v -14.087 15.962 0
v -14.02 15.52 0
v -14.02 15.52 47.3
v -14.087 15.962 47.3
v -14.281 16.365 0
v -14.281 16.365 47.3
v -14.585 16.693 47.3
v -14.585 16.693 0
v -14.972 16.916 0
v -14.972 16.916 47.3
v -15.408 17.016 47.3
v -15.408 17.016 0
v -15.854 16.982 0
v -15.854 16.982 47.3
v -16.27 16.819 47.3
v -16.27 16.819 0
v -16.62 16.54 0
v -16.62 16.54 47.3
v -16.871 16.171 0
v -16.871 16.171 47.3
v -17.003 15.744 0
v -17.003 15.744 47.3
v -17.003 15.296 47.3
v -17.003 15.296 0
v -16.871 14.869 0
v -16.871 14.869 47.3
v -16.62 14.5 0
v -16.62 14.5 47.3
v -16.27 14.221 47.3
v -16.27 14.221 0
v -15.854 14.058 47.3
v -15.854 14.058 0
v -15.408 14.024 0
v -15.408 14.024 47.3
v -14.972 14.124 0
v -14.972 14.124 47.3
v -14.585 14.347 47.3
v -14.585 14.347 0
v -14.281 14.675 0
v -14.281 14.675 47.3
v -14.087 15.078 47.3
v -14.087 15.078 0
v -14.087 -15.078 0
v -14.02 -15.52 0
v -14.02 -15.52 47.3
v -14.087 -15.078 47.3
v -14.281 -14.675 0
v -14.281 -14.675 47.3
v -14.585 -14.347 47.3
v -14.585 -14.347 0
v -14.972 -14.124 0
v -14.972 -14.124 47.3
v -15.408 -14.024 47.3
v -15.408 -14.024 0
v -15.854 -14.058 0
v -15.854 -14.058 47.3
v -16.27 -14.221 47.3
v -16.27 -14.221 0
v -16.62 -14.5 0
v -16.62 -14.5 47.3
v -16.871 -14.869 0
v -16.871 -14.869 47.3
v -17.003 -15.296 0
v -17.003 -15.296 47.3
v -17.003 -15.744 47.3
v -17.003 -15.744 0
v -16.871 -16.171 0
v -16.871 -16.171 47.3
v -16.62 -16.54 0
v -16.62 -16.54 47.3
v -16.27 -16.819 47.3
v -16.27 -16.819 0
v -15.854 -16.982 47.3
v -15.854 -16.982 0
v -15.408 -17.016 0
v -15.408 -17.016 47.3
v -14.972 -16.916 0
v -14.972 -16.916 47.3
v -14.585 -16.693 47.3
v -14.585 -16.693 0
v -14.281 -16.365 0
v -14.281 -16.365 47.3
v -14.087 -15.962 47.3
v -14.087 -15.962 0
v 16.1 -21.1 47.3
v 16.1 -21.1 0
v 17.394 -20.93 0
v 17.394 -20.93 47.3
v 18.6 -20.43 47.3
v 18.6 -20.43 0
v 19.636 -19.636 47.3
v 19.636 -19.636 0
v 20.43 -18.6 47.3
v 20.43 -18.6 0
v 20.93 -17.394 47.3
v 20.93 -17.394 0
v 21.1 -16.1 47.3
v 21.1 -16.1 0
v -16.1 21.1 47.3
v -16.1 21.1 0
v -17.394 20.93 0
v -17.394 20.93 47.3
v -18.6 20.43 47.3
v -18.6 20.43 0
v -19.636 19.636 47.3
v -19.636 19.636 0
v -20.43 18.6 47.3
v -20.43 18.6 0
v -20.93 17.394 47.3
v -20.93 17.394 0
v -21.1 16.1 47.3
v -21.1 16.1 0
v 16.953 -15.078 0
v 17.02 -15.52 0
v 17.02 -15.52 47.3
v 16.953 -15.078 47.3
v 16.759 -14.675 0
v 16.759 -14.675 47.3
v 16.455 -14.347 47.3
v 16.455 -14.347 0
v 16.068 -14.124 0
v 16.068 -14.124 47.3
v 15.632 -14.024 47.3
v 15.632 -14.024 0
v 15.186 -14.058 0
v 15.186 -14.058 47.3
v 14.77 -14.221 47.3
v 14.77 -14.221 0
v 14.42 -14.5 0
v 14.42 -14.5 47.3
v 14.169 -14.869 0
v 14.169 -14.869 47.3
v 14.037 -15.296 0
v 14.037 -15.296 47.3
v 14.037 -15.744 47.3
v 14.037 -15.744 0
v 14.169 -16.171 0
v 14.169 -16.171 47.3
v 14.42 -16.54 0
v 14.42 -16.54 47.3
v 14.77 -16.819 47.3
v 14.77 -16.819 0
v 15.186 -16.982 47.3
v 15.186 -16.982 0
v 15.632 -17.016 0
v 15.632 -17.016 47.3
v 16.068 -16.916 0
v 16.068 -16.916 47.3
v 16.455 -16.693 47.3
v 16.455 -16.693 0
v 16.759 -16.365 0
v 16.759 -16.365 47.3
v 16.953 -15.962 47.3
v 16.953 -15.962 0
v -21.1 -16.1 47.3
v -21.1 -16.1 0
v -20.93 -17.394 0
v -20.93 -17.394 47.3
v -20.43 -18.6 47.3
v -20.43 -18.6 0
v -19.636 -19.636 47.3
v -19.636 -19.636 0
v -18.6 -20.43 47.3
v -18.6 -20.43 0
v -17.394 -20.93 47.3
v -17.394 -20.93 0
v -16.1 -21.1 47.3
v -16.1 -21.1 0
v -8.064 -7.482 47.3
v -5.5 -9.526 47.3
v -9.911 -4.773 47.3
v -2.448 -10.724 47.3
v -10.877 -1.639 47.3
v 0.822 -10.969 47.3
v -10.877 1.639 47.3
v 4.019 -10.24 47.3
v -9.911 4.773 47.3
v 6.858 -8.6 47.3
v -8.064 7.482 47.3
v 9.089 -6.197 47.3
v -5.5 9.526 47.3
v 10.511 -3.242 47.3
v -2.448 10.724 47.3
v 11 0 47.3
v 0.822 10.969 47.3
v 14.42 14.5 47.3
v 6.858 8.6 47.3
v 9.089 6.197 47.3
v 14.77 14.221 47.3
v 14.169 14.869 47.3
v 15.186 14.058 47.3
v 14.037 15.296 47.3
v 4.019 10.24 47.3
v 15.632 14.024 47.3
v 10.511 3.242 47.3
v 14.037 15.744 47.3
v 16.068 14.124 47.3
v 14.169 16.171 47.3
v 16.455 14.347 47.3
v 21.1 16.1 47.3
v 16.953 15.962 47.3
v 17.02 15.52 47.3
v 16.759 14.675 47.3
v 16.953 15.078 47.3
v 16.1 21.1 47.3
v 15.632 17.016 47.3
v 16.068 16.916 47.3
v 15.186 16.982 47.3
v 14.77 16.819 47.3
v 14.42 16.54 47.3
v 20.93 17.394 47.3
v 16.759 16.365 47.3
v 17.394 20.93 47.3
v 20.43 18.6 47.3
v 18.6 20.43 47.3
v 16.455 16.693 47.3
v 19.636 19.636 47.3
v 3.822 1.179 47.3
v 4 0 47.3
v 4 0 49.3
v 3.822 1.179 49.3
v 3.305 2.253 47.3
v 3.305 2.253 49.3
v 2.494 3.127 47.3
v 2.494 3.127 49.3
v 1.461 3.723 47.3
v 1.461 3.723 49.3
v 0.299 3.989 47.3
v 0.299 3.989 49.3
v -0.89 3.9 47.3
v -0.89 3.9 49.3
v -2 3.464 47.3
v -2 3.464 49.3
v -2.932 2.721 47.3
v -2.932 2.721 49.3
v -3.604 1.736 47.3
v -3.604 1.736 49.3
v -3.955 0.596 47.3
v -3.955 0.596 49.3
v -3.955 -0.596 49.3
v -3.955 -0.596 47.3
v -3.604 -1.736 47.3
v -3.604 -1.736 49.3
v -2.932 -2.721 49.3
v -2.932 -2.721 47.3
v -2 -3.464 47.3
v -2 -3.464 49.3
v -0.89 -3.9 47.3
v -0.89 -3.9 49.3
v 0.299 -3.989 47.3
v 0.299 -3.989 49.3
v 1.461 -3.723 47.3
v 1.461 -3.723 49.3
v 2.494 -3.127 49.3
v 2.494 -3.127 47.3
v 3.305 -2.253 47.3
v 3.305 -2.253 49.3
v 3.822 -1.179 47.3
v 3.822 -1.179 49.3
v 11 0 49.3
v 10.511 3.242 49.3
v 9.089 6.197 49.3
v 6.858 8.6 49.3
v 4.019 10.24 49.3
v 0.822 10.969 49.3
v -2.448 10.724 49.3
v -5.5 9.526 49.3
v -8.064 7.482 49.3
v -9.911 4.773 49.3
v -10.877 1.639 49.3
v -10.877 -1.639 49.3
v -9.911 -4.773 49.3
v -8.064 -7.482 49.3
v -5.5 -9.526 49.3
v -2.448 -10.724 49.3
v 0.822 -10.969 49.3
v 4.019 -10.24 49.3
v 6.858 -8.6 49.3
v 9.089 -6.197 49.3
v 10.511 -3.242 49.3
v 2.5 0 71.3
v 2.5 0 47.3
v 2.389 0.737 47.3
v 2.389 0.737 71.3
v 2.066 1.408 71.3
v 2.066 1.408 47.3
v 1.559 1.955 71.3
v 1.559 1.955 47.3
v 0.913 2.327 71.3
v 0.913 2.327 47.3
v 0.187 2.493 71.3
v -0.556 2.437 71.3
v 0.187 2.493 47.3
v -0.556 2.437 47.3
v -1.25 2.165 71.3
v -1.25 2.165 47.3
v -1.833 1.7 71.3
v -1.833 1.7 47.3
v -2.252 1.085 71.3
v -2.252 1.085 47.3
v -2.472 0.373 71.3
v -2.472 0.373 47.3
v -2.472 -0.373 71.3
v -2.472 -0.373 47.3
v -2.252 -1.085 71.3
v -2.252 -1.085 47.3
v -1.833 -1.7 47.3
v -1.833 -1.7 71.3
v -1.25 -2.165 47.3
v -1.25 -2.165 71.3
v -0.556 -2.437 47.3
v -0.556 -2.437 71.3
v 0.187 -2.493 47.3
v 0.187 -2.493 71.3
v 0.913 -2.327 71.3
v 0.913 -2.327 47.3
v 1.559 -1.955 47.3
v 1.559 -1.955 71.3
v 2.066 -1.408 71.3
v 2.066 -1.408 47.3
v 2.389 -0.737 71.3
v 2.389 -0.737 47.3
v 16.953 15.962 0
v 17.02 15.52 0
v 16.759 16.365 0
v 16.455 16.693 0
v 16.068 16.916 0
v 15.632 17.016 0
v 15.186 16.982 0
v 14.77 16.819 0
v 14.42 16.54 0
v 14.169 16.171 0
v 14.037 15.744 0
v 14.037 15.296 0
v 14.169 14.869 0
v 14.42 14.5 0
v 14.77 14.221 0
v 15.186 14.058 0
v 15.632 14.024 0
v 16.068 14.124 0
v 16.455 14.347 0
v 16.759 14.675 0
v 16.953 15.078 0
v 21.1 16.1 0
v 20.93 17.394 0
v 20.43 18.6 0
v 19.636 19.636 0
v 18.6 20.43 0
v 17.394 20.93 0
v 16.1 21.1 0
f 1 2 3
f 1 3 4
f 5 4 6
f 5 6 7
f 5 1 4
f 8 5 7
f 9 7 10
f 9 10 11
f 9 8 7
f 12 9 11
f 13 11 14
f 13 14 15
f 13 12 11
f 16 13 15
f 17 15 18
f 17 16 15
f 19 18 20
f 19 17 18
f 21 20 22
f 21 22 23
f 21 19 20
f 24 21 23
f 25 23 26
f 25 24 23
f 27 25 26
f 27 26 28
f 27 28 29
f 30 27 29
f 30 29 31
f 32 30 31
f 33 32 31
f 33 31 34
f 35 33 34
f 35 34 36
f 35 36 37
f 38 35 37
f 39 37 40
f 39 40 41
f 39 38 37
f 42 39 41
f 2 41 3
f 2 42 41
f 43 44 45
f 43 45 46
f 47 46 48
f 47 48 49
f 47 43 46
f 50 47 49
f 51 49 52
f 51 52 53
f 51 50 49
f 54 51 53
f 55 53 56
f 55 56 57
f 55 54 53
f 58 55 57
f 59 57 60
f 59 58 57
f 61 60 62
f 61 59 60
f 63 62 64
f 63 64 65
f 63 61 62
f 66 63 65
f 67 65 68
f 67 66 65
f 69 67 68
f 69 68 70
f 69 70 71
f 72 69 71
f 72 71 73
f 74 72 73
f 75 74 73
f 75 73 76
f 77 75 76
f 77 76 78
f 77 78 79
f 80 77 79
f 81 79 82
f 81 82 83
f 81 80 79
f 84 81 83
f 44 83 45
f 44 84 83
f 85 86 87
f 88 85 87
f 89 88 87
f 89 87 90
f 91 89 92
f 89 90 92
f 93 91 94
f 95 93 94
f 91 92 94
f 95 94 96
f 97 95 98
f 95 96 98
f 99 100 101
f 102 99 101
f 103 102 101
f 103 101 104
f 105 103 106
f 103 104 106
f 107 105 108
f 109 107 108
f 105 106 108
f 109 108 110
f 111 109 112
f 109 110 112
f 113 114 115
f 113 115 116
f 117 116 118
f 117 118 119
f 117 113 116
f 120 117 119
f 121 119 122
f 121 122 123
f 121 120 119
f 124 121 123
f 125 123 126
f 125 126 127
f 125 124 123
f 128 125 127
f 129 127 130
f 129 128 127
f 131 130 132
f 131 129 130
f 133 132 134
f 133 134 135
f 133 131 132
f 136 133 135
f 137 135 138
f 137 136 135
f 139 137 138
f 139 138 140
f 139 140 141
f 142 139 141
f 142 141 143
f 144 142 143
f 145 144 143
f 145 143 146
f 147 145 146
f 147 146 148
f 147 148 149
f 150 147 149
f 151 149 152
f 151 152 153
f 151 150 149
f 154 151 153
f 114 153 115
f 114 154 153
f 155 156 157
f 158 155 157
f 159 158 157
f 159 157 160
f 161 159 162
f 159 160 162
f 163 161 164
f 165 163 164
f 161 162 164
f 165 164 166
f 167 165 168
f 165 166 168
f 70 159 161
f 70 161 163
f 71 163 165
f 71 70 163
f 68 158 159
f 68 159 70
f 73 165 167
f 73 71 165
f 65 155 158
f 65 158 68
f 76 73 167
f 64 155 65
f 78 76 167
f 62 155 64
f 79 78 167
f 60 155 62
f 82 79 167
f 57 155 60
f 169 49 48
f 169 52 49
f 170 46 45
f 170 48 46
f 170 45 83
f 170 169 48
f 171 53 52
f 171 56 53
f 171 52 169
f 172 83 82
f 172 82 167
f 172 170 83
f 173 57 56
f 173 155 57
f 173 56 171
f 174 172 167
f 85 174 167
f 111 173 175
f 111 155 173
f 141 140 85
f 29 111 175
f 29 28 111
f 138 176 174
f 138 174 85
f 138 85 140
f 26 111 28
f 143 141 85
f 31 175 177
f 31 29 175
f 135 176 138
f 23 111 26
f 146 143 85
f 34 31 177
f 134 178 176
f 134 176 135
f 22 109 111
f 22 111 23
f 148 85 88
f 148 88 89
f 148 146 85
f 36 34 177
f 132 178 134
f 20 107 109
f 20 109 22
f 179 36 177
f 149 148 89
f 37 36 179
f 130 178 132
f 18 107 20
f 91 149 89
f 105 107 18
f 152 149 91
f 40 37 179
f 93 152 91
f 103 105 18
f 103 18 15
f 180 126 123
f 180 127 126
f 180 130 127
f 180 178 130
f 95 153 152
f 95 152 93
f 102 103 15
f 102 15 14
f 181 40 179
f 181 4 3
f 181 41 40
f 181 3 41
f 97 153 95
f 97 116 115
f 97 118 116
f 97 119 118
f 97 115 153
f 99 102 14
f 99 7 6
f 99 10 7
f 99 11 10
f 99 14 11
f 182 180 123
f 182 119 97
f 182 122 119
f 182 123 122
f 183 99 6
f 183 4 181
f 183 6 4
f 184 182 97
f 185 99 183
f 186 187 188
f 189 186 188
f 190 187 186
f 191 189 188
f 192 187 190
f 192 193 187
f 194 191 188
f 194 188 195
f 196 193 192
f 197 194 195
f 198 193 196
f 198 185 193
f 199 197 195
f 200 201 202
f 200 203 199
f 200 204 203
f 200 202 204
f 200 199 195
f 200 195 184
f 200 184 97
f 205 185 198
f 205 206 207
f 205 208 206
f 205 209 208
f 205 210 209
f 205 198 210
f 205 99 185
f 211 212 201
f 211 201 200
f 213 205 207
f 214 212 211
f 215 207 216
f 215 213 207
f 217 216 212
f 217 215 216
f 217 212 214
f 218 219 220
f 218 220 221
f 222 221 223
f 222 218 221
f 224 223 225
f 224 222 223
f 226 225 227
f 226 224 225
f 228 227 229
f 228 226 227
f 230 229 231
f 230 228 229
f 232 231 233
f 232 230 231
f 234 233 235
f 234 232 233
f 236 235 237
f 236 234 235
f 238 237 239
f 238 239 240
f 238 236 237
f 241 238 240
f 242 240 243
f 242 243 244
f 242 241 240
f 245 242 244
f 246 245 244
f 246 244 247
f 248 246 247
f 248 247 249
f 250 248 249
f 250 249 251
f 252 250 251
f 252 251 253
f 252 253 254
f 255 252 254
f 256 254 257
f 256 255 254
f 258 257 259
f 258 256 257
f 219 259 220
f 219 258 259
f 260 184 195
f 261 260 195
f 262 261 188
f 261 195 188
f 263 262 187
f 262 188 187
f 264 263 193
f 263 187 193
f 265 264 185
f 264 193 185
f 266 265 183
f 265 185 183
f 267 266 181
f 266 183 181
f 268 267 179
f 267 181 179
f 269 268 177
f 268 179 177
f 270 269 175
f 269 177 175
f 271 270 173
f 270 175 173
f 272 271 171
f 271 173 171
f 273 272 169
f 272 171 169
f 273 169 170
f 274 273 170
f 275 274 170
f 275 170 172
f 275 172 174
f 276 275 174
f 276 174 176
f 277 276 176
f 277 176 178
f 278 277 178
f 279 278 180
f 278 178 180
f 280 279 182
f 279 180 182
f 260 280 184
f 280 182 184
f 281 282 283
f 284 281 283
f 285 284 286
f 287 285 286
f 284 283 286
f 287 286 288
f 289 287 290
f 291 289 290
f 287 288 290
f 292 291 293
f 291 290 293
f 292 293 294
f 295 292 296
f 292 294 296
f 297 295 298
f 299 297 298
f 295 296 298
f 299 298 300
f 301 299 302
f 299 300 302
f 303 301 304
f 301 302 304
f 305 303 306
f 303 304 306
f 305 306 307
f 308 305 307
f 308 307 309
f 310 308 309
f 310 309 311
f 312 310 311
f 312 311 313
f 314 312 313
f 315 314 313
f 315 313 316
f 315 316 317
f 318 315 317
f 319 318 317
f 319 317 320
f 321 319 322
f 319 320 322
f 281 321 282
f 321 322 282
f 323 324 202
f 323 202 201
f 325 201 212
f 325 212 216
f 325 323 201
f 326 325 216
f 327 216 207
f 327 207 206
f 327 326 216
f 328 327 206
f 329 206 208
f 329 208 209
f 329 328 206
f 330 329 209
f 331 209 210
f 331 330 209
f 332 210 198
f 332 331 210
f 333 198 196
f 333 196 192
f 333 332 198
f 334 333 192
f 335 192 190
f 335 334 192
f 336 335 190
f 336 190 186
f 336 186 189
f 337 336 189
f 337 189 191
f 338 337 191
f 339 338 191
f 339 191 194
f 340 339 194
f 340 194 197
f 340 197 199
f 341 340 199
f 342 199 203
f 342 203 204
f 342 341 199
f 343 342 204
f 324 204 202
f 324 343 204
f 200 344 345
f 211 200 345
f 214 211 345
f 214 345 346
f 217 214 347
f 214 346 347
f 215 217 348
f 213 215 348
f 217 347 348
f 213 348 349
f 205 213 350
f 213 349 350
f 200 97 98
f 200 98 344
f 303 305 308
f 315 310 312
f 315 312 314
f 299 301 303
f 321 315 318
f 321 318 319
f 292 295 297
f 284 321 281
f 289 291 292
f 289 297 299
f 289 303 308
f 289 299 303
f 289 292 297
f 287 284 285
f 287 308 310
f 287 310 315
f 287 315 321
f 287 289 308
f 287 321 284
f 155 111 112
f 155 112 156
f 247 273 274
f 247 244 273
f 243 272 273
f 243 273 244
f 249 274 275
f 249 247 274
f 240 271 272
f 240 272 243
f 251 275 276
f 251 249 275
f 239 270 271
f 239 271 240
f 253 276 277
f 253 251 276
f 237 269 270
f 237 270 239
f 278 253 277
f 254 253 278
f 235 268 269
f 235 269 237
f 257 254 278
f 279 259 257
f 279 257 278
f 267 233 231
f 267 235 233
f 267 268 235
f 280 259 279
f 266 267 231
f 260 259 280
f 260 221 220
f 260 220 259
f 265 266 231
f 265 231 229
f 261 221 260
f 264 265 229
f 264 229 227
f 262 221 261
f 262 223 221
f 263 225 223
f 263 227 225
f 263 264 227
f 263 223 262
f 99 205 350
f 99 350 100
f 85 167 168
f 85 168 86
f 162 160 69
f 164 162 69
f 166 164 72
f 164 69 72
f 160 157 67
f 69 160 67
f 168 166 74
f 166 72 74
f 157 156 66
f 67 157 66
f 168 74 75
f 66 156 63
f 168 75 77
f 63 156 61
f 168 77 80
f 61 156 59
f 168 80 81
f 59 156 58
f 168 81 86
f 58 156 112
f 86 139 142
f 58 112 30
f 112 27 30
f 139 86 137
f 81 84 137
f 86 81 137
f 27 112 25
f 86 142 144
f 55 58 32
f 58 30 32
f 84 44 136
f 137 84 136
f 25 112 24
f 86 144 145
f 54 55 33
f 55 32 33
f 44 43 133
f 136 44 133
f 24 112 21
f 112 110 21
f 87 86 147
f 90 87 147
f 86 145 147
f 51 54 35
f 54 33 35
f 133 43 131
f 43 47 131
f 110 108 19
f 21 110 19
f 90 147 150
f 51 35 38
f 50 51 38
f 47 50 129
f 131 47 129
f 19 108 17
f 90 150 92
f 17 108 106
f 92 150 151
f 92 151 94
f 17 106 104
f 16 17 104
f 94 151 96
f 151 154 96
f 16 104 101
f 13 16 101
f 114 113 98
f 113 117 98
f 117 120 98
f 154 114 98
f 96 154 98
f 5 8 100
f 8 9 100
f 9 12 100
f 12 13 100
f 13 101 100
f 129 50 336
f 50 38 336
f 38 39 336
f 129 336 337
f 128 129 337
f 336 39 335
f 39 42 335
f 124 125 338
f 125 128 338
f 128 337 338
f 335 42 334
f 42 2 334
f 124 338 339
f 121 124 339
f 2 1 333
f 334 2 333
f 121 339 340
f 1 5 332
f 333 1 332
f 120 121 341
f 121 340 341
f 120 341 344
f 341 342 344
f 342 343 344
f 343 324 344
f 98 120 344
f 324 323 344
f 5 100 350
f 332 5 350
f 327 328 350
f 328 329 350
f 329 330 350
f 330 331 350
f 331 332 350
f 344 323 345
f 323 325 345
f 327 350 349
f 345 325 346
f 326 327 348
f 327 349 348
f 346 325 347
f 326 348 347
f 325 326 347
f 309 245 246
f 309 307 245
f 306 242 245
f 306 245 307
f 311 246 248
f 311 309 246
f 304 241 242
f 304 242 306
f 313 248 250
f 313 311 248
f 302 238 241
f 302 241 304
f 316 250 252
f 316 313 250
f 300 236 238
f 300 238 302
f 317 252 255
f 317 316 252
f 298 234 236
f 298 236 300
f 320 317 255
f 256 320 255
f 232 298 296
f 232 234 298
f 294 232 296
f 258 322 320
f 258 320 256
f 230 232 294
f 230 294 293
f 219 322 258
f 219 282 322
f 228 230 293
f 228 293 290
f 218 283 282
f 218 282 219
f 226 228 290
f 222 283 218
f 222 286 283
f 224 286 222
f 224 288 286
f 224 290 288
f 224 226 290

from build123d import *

# Parameters (mm, degrees)
F0_R     = 1.5
F1_DEPTH = 47.3
F2_R     = 11
F2_R_2   = 4
F3_DEPTH = 2
F4_R     = 2.5
F5_DEPTH = 24


with BuildPart() as f1:
    # F0 (on Top) → F1 (new body)
    with BuildSketch(Plane.XY):
        with BuildLine():
            Line((16.1, 21.1), (-16.1, 21.1))
            ThreePointArc((-16.1, 21.1), (-19.635534, 19.635534), (-21.1, 16.1))
            Line((-21.1, 16.1), (-21.1, -16.1))
            ThreePointArc((-21.1, -16.1), (-19.635534, -19.635534), (-16.1, -21.1))
            Line((-16.1, -21.1), (16.1, -21.1))
            ThreePointArc((16.1, -21.1), (19.635534, -19.635534), (21.1, -16.1))
            Line((21.1, -16.1), (21.1, 16.1))
            ThreePointArc((21.1, 16.1), (19.635534, 19.635534), (16.1, 21.1))
        make_face()
        with Locations((-15.52, -15.52)):
            Circle(F0_R, mode=Mode.SUBTRACT)
        with Locations((15.52, -15.52)):
            Circle(F0_R, mode=Mode.SUBTRACT)
        with Locations((-15.52, 15.52)):
            Circle(F0_R, mode=Mode.SUBTRACT)
        with Locations((15.52, 15.52)):
            Circle(F0_R, mode=Mode.SUBTRACT)
    extrude(amount=F1_DEPTH)

    # F2 (on face) → F3 (join)
    with BuildSketch(Plane.XY.offset(47.3)):
        Circle(F2_R)
        Circle(F2_R_2, mode=Mode.SUBTRACT)
    extrude(amount=F3_DEPTH)

    # F4 (on face) → F5 (join)
    with BuildSketch(Plane.XY.offset(47.3)):
        Circle(F4_R)
    extrude(amount=F5_DEPTH)


solid = f1.part
